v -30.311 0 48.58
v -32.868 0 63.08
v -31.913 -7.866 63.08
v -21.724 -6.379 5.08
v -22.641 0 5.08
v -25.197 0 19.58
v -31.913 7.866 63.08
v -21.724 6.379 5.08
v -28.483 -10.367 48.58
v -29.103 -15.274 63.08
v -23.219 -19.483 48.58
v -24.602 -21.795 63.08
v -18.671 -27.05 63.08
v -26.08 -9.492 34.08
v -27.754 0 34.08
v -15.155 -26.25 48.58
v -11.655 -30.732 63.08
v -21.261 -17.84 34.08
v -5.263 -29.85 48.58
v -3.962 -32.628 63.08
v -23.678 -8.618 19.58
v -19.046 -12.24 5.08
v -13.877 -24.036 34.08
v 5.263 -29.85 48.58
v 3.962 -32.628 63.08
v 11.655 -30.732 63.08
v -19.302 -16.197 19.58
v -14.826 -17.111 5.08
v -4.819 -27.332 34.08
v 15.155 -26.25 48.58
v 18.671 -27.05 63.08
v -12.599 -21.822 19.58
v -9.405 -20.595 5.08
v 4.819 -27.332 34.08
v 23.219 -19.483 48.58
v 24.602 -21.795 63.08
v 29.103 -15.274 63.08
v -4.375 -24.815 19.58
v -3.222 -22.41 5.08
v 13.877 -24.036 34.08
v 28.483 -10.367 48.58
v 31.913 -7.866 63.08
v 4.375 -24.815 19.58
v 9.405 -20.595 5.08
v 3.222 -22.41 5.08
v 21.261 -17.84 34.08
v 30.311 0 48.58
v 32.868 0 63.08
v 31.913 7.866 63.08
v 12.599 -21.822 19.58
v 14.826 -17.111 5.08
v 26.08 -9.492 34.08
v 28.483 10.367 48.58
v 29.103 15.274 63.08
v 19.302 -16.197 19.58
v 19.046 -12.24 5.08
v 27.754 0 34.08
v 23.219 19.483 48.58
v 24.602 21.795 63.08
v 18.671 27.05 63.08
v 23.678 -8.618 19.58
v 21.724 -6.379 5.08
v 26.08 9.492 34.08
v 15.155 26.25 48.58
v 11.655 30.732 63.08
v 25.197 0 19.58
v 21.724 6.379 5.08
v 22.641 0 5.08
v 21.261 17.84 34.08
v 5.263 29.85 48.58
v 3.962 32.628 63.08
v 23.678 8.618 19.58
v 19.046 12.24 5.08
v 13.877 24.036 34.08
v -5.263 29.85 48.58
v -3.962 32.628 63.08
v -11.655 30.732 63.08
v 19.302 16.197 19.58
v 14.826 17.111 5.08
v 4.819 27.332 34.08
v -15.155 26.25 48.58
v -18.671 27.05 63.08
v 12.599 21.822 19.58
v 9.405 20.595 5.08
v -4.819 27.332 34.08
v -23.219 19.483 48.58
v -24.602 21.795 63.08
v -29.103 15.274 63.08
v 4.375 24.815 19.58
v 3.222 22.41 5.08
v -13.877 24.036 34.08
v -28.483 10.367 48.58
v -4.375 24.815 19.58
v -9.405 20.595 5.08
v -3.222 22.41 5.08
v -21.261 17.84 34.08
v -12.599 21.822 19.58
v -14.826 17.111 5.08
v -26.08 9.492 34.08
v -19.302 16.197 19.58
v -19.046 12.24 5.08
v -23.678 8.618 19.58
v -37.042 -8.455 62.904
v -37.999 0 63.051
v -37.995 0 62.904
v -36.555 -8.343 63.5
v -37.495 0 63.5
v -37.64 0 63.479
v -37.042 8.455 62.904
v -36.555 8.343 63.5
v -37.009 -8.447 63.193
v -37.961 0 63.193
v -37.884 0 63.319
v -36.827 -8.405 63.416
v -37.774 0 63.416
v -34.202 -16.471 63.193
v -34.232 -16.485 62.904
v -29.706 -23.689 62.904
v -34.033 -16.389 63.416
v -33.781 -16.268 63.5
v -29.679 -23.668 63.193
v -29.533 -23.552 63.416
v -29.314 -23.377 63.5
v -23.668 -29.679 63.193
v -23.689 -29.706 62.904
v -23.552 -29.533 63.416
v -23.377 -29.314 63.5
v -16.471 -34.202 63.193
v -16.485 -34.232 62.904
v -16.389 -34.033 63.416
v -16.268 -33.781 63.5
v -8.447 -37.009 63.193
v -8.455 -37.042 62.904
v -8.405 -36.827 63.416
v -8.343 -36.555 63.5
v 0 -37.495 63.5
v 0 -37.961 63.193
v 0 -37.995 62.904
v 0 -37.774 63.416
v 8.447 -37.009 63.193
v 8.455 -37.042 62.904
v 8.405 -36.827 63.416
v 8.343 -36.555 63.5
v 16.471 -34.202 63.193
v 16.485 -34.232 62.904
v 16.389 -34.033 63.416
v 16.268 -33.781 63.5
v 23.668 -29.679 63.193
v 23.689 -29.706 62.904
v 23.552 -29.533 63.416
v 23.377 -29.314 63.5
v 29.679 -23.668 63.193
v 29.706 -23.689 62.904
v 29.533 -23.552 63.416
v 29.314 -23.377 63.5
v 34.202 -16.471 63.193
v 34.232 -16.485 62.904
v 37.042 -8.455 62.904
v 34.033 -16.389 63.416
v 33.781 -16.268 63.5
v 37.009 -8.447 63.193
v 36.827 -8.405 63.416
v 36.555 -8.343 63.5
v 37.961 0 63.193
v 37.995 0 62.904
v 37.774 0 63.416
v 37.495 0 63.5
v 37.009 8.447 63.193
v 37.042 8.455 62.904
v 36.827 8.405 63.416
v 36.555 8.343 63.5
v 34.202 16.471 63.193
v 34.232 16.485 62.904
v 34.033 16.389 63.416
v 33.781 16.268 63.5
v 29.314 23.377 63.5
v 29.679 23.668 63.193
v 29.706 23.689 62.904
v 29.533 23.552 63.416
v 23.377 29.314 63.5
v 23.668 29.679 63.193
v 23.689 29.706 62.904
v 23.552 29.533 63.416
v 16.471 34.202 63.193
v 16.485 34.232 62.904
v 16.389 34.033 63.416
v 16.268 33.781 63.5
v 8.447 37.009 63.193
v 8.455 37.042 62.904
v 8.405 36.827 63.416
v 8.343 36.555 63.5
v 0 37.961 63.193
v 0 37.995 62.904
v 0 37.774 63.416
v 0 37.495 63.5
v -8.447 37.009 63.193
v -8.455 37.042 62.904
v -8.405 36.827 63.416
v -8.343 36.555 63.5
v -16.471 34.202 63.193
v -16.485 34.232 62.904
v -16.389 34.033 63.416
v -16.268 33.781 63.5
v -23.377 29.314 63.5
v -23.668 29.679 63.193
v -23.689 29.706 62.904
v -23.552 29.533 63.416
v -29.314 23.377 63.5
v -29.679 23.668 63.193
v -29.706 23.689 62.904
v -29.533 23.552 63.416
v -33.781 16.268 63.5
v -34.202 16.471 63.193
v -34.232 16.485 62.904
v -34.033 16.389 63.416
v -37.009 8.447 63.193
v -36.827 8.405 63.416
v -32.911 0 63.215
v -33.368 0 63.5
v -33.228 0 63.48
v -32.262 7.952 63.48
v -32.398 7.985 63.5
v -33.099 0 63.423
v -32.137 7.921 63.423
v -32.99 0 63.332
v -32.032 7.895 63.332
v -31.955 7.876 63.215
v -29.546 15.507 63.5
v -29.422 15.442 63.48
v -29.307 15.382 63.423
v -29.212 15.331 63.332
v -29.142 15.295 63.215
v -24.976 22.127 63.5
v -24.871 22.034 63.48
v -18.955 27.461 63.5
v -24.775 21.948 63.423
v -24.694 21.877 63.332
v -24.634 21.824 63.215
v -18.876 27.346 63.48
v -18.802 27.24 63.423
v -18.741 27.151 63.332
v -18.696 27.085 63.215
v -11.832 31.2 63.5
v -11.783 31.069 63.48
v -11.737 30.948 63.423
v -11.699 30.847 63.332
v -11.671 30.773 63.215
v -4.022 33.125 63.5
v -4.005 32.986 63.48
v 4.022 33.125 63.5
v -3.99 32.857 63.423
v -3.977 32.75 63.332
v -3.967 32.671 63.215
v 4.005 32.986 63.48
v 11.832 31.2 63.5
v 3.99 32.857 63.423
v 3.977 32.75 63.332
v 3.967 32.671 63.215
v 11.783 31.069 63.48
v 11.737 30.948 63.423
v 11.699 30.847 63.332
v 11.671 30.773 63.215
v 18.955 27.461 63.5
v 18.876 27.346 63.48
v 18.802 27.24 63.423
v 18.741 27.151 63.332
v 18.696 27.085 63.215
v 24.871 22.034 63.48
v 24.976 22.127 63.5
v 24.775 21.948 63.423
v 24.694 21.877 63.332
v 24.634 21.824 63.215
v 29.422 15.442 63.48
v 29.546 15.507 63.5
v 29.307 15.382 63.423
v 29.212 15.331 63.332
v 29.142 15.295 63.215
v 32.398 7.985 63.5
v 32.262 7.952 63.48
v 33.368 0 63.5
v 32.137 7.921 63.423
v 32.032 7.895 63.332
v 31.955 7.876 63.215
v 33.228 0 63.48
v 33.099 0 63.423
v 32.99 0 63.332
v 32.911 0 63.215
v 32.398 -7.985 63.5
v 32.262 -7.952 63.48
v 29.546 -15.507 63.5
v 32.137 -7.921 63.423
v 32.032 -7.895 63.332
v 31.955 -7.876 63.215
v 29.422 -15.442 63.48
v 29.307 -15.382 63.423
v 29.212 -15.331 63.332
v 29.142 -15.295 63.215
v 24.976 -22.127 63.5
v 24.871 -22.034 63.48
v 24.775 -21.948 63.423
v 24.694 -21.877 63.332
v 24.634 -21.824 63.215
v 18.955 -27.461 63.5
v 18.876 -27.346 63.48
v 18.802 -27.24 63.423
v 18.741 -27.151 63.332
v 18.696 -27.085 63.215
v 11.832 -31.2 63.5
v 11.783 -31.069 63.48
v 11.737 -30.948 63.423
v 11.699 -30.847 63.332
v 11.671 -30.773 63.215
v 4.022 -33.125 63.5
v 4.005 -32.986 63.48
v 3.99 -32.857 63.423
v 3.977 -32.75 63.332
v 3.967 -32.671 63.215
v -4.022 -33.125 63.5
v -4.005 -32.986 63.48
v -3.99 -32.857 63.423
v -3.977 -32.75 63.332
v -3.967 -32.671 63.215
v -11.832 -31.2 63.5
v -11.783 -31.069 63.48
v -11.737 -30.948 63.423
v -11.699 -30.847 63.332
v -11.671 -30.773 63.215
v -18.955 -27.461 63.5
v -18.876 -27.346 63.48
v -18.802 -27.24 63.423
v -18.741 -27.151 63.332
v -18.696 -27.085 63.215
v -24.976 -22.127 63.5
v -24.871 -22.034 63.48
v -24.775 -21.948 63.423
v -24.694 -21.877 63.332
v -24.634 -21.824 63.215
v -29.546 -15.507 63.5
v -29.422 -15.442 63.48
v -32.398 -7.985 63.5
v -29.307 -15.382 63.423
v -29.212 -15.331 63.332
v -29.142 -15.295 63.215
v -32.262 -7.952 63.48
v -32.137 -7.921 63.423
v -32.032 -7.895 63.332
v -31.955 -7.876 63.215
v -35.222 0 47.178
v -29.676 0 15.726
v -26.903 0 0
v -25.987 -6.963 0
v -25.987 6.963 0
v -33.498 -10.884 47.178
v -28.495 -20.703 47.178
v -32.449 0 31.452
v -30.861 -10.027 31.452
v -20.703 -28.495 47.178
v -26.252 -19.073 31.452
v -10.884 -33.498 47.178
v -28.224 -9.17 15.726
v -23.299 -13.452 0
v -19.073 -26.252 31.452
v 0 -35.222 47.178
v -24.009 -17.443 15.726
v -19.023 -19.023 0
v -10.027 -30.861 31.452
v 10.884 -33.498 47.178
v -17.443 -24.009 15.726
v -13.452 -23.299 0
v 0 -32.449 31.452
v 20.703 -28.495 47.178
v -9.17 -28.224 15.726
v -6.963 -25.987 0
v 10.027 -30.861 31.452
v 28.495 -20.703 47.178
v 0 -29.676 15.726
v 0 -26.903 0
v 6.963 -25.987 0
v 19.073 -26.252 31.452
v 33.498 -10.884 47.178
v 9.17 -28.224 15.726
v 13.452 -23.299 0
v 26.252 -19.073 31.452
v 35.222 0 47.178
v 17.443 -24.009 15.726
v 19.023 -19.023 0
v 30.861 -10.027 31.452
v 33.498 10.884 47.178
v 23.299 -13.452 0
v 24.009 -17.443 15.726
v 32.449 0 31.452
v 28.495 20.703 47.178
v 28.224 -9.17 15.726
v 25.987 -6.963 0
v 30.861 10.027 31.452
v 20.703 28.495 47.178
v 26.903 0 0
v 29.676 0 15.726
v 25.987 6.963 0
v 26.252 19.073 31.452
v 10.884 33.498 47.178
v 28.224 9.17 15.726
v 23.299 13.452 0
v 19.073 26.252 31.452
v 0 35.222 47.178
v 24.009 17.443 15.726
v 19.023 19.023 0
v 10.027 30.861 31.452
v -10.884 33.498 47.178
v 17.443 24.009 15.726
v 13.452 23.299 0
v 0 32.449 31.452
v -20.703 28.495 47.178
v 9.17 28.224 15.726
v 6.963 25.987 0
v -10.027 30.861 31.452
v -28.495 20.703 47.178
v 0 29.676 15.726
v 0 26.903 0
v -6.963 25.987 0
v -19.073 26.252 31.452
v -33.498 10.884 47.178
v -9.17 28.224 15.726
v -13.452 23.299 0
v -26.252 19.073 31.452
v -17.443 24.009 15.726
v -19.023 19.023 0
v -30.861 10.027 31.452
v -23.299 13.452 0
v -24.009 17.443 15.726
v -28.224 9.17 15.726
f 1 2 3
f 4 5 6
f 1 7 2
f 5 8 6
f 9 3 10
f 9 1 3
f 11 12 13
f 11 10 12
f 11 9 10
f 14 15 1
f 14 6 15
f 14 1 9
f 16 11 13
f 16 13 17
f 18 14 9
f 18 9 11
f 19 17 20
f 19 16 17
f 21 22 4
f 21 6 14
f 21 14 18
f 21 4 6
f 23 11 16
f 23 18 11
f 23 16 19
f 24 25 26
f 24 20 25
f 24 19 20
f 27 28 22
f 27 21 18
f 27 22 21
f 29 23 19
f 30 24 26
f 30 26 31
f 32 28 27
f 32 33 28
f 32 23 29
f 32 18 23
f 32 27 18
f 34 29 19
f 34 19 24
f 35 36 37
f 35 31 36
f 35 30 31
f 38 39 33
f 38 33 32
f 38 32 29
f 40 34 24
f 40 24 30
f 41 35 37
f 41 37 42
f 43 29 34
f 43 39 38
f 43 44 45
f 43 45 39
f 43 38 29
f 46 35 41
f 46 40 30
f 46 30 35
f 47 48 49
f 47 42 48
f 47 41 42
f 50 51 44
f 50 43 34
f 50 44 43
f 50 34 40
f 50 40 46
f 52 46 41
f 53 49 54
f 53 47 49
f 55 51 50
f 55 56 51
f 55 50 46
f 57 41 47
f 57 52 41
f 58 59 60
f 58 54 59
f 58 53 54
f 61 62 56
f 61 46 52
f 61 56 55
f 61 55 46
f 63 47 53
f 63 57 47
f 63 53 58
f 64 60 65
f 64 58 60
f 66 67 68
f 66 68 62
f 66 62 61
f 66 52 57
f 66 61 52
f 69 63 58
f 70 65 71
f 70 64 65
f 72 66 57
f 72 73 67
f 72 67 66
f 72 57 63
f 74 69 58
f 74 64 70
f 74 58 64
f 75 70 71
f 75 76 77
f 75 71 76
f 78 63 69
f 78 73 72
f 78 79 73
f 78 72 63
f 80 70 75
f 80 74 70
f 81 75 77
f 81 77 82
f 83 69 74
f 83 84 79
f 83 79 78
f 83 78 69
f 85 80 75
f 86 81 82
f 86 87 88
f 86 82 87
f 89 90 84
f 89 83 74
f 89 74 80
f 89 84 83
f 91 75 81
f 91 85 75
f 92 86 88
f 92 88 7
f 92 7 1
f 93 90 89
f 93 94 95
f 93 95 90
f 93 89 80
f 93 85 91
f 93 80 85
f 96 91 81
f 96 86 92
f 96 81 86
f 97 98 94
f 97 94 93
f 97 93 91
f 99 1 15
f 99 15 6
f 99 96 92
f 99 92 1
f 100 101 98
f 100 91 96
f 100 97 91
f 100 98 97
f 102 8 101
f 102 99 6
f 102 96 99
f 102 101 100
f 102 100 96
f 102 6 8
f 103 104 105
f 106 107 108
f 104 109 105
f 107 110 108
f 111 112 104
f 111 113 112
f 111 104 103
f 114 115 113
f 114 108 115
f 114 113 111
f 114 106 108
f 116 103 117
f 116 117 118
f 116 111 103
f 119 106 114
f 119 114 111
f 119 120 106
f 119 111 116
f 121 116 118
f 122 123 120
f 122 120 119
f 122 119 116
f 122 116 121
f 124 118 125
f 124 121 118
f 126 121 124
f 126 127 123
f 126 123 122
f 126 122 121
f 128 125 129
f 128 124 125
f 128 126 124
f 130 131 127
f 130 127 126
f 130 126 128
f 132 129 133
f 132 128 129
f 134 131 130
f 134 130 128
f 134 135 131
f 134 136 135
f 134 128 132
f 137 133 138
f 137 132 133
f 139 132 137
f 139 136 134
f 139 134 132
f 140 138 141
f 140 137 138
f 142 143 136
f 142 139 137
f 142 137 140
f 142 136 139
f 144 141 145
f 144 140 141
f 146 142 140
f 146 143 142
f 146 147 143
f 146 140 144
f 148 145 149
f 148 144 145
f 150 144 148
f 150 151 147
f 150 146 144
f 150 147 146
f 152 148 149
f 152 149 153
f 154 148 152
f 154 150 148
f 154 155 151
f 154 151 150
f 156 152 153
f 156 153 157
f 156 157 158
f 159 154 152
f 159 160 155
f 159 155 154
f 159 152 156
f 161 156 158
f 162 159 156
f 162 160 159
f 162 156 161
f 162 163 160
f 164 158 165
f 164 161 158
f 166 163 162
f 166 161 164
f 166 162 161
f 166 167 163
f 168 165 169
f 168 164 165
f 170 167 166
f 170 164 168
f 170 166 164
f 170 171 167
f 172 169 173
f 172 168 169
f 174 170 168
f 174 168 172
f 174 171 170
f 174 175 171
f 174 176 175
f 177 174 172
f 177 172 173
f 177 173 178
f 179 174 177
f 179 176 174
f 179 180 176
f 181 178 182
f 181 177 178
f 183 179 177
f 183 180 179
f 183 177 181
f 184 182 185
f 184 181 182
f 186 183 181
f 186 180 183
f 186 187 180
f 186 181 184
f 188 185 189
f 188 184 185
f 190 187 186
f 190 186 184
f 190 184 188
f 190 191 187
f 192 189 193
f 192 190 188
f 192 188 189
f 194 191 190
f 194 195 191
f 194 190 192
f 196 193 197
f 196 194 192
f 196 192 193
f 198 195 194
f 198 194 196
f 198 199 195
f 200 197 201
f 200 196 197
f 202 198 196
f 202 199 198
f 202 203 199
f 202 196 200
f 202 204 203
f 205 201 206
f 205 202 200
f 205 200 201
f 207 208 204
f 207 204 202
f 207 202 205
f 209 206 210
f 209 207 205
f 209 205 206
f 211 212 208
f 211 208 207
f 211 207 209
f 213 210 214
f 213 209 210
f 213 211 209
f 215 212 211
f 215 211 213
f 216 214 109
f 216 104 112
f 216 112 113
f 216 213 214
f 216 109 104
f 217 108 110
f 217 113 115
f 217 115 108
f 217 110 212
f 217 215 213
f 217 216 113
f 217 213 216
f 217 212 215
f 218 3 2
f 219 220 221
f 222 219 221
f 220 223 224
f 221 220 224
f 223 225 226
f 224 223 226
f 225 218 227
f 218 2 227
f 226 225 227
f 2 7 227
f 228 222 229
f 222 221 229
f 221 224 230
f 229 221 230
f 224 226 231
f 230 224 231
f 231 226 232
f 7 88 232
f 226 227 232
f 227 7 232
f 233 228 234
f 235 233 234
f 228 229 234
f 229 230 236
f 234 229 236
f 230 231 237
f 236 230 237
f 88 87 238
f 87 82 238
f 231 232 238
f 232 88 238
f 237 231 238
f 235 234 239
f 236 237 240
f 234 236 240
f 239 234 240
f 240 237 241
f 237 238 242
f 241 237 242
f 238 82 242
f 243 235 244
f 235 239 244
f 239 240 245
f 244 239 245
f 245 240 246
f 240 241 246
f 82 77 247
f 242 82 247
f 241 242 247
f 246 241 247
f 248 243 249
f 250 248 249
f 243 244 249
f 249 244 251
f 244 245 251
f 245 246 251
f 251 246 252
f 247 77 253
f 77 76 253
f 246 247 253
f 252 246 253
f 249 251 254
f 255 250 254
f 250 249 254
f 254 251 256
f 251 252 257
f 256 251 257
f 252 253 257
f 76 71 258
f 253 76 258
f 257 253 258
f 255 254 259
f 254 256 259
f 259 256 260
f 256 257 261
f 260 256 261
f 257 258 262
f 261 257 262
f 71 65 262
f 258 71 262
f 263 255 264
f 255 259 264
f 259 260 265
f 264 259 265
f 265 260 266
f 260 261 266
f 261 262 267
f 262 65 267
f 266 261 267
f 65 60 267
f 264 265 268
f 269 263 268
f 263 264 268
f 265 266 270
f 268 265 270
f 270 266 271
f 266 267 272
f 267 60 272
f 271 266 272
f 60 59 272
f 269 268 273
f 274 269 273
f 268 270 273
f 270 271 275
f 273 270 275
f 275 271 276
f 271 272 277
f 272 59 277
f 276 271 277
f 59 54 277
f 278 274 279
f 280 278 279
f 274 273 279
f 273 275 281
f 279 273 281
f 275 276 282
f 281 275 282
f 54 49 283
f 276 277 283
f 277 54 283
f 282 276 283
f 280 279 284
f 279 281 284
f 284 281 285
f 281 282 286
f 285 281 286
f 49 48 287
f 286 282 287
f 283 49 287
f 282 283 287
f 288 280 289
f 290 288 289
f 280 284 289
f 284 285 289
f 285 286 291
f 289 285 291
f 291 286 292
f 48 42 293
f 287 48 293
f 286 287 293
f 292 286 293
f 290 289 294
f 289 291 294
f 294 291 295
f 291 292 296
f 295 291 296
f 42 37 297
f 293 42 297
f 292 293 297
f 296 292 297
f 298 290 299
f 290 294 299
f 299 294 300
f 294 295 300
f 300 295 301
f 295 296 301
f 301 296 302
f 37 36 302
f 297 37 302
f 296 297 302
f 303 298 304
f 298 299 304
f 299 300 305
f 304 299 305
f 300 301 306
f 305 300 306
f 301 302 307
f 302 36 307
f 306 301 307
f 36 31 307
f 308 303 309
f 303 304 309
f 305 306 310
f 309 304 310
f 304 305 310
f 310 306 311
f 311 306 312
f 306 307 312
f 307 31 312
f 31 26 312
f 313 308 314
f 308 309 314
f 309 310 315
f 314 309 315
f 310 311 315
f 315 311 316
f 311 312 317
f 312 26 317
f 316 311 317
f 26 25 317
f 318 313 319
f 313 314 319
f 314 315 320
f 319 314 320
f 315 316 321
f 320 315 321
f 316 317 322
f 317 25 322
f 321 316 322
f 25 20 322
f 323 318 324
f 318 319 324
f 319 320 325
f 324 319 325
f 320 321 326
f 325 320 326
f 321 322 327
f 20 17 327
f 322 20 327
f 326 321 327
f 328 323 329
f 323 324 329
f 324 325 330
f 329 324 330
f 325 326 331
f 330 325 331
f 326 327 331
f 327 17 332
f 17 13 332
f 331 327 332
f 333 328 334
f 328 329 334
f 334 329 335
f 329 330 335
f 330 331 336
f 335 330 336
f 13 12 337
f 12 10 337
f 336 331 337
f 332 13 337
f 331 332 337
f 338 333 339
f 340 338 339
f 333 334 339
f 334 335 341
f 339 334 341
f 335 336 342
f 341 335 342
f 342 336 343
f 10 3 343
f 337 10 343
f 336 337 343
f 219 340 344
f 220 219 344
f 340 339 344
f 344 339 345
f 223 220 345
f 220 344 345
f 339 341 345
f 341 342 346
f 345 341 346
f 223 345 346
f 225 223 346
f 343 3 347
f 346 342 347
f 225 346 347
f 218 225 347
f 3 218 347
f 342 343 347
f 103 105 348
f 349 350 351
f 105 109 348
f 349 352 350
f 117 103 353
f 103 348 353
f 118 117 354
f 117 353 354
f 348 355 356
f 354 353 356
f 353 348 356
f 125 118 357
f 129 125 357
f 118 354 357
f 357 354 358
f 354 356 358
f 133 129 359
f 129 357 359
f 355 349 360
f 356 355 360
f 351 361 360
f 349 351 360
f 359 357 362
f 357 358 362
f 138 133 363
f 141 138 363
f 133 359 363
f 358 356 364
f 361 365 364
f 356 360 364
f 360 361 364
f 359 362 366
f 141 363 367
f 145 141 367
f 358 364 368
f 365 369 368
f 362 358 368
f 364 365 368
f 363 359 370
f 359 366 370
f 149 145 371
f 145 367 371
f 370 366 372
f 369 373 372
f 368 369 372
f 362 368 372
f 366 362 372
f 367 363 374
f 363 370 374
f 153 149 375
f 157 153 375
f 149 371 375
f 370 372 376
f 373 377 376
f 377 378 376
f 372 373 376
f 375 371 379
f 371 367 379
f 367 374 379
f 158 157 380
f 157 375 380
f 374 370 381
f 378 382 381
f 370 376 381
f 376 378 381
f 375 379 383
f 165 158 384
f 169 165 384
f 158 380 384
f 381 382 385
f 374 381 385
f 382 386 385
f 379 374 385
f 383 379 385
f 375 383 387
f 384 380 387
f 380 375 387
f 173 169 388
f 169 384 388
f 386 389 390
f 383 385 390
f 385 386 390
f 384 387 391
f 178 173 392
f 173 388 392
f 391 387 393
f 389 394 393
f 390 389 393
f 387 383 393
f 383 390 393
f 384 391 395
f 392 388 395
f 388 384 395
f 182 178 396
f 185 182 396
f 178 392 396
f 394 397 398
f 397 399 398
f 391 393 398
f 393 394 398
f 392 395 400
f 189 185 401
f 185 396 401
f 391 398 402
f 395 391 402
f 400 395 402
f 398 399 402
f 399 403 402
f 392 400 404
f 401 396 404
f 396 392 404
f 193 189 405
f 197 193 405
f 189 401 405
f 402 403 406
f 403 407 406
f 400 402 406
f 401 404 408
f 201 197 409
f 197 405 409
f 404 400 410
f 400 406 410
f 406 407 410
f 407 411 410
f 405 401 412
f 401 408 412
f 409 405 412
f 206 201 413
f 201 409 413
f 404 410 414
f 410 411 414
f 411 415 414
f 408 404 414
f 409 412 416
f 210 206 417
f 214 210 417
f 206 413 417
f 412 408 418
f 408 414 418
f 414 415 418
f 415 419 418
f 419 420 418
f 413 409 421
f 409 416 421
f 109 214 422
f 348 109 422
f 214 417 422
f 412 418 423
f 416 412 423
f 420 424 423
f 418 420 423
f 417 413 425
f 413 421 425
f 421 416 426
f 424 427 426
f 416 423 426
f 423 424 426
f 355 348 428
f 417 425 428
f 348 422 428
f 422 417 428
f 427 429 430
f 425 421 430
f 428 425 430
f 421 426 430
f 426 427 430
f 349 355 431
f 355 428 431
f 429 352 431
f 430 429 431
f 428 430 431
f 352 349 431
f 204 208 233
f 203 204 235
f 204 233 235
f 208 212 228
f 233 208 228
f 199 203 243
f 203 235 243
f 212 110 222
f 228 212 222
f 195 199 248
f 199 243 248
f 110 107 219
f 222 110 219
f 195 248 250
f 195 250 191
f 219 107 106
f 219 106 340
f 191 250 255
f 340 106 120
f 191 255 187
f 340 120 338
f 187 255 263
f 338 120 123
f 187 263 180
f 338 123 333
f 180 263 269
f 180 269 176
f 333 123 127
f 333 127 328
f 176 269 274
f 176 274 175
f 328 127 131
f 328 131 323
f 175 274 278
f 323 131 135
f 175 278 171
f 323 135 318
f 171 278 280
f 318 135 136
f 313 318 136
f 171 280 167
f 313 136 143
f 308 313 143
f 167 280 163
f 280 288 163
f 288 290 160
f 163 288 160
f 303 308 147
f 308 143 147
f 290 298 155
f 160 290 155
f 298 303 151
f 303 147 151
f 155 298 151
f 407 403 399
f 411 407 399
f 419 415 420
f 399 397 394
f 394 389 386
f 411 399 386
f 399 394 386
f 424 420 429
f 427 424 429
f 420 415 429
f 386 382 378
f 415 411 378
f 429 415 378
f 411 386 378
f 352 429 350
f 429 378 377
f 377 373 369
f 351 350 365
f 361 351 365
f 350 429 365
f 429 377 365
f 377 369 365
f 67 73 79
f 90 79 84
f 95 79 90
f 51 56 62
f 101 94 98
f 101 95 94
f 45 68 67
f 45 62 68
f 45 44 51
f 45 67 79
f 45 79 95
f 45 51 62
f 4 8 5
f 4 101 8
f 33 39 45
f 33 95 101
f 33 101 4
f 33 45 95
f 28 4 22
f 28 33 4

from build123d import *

# Parameters (mm, degrees)
F2_T = -5.08
F3_R = 0.508


with BuildPart() as f1:
    # F0 (on Front) → F1 (revolve)
    with BuildSketch(Plane.XZ):
        Polygon((0, 0), (0, 63.5), (-38.1, 63.5), (-26.903236725, 0), align=None)
    revolve(axis=Axis((0, 0, 31.75), (0, 0, 1)))

    # F2
    f2_openings = [f1.faces().sort_by_distance(p)[0] for p in [
        (0, 0, 63.5),
    ]]
    offset(amount=F2_T, openings=f2_openings)

    # F3
    f3_edges = [f1.edges().sort_by_distance(p)[0] for p in [
        (38.1, 0, 63.5),
        (32.941633, 0, 63.5),
    ]]
    fillet(f3_edges, radius=F3_R)


solid = f1.part
